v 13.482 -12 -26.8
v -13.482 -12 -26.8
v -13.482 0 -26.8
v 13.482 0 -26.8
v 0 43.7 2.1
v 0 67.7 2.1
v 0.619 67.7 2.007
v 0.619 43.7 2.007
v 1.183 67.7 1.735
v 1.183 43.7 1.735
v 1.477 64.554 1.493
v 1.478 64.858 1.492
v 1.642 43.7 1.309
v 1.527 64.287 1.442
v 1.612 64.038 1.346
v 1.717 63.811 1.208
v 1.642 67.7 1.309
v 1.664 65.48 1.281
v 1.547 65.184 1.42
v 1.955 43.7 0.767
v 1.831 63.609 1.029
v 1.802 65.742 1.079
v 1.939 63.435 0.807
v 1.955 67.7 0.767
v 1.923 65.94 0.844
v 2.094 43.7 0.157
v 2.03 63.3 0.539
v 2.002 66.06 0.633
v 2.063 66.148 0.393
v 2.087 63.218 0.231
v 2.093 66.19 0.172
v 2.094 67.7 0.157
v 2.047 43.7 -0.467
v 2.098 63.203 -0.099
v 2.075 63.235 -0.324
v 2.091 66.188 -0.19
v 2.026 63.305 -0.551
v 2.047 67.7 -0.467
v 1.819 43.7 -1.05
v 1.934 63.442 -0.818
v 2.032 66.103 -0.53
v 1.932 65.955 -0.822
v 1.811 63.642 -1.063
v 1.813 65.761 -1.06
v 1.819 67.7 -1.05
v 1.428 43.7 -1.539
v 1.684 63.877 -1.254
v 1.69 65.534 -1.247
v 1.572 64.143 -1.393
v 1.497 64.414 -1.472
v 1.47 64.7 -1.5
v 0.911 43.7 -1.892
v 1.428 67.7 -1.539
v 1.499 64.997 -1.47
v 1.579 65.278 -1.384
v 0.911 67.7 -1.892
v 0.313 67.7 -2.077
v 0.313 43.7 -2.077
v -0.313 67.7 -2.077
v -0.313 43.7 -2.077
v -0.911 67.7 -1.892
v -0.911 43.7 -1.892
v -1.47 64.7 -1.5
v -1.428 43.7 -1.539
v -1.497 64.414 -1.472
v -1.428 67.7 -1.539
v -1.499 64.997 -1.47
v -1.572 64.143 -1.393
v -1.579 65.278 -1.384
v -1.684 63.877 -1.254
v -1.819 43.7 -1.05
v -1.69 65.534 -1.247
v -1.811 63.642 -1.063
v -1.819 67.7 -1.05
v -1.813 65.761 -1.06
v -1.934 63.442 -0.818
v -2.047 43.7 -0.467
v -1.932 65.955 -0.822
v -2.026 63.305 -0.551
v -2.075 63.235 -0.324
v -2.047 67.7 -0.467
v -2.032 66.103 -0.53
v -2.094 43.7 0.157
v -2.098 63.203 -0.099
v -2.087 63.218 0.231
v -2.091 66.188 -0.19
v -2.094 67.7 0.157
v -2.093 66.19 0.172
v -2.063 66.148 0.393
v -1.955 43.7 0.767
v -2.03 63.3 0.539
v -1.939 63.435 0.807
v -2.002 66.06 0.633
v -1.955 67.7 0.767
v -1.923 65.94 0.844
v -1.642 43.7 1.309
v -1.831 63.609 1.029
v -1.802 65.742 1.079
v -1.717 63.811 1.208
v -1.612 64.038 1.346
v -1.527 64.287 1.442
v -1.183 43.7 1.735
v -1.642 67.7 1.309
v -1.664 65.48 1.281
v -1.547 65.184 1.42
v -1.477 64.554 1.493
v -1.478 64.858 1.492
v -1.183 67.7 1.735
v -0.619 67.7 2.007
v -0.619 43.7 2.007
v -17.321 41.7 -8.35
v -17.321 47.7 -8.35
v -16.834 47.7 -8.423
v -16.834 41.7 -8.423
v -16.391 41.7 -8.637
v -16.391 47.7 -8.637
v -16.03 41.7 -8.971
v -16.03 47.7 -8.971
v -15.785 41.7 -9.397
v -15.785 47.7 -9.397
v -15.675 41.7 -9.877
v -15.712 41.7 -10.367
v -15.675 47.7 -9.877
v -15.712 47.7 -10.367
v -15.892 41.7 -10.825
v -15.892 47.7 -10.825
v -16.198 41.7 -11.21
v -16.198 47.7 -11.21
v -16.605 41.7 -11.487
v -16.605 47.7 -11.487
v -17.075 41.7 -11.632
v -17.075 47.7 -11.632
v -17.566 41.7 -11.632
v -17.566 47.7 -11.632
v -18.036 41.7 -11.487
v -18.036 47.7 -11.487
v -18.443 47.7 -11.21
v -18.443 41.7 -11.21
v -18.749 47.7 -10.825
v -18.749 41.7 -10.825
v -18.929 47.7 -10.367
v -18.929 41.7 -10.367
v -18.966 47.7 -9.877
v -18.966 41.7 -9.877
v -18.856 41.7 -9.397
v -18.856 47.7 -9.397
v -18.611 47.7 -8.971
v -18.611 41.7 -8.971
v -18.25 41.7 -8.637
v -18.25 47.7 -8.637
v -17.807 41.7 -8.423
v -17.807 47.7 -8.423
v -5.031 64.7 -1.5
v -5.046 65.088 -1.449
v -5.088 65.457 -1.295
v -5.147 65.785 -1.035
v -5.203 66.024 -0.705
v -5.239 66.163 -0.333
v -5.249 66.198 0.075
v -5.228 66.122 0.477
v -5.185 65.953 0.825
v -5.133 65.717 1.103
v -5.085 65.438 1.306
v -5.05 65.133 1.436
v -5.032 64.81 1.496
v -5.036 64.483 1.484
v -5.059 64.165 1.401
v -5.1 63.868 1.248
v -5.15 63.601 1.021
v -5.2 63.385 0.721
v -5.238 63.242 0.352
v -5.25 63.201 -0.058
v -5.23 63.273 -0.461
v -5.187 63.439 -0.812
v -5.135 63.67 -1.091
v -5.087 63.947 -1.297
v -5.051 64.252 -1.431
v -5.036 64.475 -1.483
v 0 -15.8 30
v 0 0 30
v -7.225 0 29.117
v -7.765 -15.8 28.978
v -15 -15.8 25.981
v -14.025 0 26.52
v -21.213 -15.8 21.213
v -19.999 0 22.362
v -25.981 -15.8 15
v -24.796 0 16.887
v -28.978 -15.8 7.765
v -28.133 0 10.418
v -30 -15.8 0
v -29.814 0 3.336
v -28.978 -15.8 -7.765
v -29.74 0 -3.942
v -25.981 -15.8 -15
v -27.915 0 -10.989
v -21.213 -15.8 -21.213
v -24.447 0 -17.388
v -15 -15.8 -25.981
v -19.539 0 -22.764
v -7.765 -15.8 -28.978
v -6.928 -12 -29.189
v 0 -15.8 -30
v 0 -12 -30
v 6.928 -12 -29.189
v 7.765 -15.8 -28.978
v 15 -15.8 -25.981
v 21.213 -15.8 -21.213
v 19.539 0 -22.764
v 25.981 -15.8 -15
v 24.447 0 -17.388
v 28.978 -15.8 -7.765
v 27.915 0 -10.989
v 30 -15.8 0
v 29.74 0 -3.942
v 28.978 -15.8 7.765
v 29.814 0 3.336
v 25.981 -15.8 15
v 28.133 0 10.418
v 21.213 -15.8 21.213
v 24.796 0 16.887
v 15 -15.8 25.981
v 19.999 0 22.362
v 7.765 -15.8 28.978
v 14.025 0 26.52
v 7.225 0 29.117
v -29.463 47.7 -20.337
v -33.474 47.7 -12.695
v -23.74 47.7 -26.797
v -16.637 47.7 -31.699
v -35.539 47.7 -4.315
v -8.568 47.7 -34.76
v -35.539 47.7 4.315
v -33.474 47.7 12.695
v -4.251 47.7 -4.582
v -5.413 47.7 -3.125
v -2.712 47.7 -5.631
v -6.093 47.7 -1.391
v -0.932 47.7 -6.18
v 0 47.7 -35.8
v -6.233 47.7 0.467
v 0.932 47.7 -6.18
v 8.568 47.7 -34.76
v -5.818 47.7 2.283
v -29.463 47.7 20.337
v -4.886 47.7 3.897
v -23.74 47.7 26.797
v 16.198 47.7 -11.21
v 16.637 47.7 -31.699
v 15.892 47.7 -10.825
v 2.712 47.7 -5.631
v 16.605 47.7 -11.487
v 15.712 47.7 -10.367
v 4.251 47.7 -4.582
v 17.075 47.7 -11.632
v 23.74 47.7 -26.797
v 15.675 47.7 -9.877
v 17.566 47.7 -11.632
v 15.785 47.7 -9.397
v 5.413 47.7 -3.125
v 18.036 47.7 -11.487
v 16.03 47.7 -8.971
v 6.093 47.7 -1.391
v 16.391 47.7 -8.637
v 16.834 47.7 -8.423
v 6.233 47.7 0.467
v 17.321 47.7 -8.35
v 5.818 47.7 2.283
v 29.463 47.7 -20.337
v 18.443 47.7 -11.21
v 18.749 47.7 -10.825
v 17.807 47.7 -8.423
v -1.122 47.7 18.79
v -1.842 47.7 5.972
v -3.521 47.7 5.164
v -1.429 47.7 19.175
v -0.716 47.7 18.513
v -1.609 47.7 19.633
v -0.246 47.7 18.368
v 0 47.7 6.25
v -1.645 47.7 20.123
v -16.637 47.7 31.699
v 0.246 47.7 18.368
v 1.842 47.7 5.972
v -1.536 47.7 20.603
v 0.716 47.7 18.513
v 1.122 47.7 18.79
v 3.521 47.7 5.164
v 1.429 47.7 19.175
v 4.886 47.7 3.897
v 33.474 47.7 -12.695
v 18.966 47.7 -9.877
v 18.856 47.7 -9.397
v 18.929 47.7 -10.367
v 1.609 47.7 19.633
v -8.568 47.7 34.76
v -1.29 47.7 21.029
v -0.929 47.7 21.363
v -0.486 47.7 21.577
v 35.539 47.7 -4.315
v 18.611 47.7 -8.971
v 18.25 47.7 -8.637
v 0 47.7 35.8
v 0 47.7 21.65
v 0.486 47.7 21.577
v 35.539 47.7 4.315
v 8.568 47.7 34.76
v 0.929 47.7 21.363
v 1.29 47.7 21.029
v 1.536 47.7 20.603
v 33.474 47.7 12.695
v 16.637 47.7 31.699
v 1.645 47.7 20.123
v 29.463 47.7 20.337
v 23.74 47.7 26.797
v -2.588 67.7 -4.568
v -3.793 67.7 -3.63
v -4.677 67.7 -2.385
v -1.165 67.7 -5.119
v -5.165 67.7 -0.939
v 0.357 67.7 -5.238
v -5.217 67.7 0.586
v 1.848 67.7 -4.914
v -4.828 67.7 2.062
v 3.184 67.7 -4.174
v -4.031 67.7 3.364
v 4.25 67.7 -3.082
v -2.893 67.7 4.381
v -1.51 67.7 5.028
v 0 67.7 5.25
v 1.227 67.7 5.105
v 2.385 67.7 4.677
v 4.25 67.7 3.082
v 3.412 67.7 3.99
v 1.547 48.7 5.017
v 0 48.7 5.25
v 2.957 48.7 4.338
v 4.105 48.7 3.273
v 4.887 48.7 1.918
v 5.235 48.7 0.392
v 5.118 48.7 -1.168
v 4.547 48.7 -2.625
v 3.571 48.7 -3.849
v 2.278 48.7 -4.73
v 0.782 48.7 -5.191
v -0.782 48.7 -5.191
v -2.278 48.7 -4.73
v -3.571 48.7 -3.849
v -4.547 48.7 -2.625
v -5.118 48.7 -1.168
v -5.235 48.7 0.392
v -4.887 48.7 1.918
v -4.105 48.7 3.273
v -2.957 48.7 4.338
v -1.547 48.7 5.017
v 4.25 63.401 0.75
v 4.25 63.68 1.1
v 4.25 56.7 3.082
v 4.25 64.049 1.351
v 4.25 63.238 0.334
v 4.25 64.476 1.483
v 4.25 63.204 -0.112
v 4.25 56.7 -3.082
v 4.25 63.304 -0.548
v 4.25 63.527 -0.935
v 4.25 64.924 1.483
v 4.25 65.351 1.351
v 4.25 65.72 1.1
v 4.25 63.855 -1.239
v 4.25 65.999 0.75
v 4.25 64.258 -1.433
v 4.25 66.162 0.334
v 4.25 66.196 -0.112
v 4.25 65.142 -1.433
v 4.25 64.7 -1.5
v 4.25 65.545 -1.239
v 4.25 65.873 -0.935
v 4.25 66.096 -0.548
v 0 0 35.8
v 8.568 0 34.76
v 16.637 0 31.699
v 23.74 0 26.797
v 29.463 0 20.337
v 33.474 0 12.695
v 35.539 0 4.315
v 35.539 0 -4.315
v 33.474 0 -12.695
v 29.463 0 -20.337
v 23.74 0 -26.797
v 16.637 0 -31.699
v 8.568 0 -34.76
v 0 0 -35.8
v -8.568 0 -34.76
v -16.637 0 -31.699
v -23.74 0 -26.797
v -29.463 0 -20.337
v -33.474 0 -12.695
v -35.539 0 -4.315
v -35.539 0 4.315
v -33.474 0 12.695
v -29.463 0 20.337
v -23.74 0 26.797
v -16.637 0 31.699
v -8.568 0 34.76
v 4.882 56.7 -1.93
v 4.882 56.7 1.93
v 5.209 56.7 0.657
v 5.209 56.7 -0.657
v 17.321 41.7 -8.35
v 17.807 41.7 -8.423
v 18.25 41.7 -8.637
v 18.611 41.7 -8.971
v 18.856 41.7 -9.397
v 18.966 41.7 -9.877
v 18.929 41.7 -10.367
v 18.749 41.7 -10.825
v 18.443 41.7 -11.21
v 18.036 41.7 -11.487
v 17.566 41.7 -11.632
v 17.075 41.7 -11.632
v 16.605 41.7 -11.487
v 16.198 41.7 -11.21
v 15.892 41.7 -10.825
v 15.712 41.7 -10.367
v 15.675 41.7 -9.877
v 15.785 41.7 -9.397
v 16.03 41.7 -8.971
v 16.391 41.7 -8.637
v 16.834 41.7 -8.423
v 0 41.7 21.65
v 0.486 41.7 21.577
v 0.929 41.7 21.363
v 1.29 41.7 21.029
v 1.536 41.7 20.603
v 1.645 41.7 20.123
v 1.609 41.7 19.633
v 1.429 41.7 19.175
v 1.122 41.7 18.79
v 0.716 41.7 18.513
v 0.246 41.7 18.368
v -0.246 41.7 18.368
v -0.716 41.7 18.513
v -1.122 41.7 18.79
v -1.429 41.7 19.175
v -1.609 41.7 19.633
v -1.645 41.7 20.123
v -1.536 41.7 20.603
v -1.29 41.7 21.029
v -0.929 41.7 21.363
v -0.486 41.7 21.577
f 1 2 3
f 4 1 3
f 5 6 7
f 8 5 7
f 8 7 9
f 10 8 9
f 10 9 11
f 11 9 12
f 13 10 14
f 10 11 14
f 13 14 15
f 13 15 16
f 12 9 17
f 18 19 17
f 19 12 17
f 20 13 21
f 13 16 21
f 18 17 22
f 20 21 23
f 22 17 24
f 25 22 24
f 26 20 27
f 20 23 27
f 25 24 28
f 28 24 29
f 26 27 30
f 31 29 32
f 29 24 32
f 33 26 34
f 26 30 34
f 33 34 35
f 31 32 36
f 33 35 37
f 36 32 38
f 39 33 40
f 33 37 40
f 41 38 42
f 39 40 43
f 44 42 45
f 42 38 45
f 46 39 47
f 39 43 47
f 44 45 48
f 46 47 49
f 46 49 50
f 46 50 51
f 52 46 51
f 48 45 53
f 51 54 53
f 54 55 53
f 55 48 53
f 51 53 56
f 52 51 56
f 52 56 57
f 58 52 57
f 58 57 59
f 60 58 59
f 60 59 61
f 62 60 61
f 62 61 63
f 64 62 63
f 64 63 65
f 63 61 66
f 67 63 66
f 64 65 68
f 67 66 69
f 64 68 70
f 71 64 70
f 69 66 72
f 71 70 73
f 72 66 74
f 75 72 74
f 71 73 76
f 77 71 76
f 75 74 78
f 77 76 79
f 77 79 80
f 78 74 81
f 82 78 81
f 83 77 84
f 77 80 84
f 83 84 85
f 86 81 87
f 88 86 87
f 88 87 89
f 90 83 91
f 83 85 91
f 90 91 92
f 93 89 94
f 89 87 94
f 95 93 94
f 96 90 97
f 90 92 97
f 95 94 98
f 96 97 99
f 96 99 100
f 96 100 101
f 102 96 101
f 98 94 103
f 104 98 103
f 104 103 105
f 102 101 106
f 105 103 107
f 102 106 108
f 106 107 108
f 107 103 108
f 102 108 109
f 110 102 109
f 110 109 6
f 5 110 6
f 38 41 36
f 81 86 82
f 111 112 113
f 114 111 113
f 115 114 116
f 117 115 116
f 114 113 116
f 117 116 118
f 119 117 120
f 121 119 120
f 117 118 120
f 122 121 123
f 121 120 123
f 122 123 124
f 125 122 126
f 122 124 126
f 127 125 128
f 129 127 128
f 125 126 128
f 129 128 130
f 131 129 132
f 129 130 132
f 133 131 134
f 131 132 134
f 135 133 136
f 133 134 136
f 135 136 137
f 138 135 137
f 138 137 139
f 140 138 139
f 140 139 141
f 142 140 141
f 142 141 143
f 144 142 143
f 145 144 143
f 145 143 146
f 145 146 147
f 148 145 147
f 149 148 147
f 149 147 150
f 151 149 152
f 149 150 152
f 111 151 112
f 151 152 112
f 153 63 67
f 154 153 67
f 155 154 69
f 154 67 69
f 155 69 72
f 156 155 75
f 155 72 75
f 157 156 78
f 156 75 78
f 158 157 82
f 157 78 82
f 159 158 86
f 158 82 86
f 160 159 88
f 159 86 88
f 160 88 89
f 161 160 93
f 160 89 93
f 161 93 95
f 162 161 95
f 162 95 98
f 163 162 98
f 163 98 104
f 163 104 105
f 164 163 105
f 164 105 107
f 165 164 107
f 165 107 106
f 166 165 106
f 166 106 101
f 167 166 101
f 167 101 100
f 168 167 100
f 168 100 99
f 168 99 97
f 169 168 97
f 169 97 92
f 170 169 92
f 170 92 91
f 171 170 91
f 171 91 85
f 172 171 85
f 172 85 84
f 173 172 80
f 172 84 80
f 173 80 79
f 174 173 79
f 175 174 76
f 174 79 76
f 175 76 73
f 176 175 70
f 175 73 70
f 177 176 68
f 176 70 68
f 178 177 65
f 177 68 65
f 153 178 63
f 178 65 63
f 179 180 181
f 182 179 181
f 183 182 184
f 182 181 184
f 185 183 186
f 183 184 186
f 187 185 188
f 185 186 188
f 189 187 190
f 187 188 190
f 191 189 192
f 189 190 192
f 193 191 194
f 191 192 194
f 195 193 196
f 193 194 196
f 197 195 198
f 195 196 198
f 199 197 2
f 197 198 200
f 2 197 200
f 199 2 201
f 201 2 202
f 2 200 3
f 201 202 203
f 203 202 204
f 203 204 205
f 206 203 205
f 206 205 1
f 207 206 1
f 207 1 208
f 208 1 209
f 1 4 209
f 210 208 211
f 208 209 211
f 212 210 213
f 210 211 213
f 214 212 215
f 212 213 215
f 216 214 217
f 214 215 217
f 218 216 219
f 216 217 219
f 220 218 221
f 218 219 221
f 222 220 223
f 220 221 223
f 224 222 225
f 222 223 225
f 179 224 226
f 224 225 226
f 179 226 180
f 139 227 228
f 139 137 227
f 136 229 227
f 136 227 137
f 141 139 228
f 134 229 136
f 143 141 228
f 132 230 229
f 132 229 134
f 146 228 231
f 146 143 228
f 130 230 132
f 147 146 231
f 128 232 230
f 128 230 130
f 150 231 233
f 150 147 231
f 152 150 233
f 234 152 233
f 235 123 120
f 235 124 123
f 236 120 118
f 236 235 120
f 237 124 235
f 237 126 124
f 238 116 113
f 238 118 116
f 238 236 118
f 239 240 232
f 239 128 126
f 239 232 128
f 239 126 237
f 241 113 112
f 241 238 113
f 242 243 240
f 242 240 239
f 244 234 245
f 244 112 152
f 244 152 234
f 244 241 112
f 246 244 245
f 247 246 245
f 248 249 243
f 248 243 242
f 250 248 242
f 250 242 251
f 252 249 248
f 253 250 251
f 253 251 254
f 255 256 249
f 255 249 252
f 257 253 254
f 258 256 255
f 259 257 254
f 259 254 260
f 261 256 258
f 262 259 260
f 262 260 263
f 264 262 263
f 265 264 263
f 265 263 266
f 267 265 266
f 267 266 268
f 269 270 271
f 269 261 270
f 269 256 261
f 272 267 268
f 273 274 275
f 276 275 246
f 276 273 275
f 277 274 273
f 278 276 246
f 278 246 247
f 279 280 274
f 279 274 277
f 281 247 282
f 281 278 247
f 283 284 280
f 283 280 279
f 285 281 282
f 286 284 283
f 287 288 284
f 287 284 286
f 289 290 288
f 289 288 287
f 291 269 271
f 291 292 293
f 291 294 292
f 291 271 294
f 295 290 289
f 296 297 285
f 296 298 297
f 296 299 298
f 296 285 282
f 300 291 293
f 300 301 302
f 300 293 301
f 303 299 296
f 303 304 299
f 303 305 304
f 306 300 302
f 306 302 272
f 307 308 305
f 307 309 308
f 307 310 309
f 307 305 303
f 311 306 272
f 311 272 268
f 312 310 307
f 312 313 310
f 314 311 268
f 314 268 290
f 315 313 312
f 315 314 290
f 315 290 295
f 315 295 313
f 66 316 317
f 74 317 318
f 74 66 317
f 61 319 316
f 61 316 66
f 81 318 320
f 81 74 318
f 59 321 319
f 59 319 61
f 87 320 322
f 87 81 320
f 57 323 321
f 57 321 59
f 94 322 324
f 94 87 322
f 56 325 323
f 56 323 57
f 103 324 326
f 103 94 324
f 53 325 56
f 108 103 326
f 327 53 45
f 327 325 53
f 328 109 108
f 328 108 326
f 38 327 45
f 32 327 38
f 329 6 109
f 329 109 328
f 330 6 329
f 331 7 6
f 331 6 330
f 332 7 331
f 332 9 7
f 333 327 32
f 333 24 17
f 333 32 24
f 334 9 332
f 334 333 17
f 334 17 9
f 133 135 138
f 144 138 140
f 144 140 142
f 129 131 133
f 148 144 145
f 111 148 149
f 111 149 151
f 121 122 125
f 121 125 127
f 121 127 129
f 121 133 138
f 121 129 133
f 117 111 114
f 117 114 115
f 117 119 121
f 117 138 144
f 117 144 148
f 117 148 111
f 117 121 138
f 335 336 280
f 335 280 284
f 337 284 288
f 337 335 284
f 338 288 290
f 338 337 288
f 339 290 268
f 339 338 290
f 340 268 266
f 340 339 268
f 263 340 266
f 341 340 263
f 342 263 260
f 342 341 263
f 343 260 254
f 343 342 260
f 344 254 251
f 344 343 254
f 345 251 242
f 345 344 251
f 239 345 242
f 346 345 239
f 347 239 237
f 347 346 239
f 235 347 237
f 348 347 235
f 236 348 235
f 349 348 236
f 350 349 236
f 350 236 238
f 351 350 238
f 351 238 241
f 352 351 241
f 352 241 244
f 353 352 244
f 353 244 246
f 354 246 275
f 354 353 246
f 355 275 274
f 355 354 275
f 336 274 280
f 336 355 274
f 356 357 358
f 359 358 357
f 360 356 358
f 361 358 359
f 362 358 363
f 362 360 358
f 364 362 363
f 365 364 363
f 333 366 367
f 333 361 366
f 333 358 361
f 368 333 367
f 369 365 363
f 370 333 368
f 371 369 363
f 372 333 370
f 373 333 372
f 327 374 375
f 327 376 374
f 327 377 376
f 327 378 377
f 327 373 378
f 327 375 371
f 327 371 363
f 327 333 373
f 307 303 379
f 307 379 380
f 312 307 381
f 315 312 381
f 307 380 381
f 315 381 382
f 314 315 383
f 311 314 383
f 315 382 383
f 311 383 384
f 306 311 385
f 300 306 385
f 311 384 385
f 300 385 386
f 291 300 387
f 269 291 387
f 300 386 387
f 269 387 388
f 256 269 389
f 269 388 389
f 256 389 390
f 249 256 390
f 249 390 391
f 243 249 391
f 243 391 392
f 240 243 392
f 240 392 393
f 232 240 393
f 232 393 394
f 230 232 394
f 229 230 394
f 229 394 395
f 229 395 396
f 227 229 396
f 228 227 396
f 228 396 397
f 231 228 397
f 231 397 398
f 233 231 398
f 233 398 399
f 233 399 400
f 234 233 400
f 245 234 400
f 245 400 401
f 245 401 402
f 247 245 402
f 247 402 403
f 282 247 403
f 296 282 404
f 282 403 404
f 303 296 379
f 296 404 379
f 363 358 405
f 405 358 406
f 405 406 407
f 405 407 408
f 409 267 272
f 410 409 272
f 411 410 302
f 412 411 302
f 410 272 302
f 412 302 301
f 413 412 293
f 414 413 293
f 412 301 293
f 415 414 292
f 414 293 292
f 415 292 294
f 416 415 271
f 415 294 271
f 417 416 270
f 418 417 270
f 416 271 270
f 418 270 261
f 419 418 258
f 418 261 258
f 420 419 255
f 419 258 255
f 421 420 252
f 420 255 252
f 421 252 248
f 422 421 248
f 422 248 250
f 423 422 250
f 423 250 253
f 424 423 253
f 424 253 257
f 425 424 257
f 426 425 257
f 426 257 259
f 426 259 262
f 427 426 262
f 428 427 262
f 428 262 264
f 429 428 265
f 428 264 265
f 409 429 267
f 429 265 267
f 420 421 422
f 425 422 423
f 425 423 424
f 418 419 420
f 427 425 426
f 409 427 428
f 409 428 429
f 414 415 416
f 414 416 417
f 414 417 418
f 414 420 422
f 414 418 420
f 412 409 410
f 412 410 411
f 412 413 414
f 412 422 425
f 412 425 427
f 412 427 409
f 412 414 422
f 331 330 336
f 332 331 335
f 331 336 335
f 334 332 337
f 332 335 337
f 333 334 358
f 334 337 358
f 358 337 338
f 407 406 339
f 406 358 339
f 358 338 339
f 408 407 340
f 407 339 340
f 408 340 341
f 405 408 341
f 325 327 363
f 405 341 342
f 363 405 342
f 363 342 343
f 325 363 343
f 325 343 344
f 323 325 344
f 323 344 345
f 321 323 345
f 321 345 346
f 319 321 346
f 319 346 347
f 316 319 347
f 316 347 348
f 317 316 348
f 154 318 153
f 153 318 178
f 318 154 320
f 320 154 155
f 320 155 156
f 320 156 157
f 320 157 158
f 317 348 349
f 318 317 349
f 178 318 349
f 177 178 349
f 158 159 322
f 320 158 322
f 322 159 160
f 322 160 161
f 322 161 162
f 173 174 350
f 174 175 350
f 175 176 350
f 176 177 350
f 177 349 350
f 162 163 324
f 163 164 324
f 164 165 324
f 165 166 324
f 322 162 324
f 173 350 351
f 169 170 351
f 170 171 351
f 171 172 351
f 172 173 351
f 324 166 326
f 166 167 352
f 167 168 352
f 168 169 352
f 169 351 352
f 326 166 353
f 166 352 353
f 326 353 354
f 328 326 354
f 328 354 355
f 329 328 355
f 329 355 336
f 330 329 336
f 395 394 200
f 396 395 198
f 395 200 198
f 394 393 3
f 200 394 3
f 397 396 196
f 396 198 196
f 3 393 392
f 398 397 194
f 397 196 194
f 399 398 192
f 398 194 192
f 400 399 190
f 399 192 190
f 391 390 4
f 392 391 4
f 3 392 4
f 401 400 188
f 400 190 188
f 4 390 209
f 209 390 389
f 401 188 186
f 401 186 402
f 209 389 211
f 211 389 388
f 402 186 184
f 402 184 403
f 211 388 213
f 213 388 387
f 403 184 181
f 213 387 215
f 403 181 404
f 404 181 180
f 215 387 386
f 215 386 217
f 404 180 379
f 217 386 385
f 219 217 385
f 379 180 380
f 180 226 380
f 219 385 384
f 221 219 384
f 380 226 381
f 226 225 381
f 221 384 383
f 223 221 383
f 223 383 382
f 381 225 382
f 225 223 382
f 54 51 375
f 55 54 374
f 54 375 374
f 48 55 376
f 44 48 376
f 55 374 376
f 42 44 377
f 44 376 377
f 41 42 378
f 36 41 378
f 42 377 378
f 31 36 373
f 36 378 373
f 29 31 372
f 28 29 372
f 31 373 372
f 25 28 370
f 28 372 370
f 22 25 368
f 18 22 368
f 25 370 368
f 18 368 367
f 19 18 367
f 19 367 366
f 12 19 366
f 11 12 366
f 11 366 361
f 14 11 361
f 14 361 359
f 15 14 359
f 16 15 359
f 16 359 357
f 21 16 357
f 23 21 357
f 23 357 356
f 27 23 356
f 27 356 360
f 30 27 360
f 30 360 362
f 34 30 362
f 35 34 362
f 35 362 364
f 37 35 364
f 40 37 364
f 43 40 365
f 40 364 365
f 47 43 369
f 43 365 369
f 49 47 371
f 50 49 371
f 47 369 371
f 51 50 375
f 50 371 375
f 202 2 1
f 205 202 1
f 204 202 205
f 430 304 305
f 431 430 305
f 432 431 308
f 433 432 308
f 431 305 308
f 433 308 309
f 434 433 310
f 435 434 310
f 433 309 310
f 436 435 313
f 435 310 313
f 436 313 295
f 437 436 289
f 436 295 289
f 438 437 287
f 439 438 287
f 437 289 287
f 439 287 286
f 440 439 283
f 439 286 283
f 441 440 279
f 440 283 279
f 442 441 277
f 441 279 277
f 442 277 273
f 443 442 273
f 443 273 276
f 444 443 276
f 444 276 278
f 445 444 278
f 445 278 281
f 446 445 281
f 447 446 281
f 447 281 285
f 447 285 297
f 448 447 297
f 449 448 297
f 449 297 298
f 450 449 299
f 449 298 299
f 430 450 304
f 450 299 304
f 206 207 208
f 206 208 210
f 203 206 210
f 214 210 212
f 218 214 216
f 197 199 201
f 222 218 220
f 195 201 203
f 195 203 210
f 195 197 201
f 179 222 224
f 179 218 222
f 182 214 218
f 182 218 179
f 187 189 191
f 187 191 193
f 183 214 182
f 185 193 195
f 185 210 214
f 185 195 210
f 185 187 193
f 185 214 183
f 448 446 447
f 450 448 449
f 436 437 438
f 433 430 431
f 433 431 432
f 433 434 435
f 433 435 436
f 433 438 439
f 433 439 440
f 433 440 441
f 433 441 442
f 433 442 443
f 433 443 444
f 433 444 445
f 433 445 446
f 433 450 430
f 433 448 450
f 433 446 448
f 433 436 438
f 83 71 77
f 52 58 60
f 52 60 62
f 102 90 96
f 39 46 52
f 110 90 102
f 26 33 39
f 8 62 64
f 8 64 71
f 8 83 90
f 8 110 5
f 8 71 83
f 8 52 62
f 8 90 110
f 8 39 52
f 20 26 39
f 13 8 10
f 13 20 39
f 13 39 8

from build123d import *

# Parameters (mm, degrees)
SKETCH_1_R          = 35.8
EXTRUDE_1_DEPTH     = 47.7
SKETCH_2_R          = 5.25
EXTRUDE_2_DEPTH     = 20
SKETCH_3_W          = 7.138794325
SKETCH_3_H          = 6.164414002
CUT_EXTRUDE_1_DEPTH = 11
SKETCH_4_R          = 1.5
CUT_EXTRUDE_2_DEPTH = 87.422985947
CHAMFER_1_SIZE      = 1
SKETCH_5_R          = 1.65
CUT_EXTRUDE_3_DEPTH = 6
SKETCH_6_R          = 2.1
CUT_EXTRUDE_4_DEPTH = 24
SKETCH_7_R          = 30
EXTRUDE_3_DEPTH     = 15.8
SKETCH_8_W          = 3.2
SKETCH_8_H          = 12
CUT_EXTRUDE_5_DEPTH = 68.4


with BuildPart() as part:
    # 草图1 → 凸台-拉伸1 (new body)
    with BuildSketch(Plane(origin=(0, 0, 0), x_dir=(1, 0, 0), z_dir=(0, 1, 0))):
        with Locations(Location((0, 0, 0), (0, 0, 270))):
            Circle(SKETCH_1_R)
    extrude(amount=EXTRUDE_1_DEPTH)

    # 草图2 → 凸台-拉伸2 (add)
    with BuildSketch(Plane(origin=(0, 47.7, 0), x_dir=(1, 0, 0), z_dir=(0, 1, 0))):
        with Locations(Location((0, 0, 0), (0, 0, 270))):
            Circle(SKETCH_2_R)
    extrude(amount=EXTRUDE_2_DEPTH)

    # 草图3 → 切除-拉伸1 (cut)
    with BuildSketch(Plane(origin=(0, 67.7, 0), x_dir=(1, 0, 0), z_dir=(0, 1, 0))):
        with Locations((7.819397163, 0)):
            Rectangle(SKETCH_3_W, SKETCH_3_H)
    extrude(amount=-CUT_EXTRUDE_1_DEPTH, mode=Mode.SUBTRACT)

    # 草图4 → 切除-拉伸2 (cut, through all)
    with BuildSketch(Plane(origin=(4.25, 0, 0), x_dir=(0, 0, -1), z_dir=(1, 0, 0))):
        with Locations((0, 64.7)):
            Circle(SKETCH_4_R)
    extrude(amount=-CUT_EXTRUDE_2_DEPTH, mode=Mode.SUBTRACT)

    # 倒角1
    chamfer_1_edges = [part.edges().sort_by_distance(p)[0] for p in [
        (0, 47.7, -5.25),
    ]]
    chamfer(chamfer_1_edges, length=CHAMFER_1_SIZE)

    # 草图5 → 切除-拉伸3 (cut)
    with BuildSketch(Plane(origin=(0, 47.7, 0), x_dir=(1, 0, 0), z_dir=(0, 1, 0))):
        with Locations(Location((0, -20, 0), (0, 0, 270))):
            Circle(SKETCH_5_R)
        with Locations(Location((-17.320508076, 10, 0), (0, 0, 270))):
            Circle(SKETCH_5_R)
        with Locations(Location((17.320508076, 10, 0), (0, 0, 270))):
            Circle(SKETCH_5_R)
    extrude(amount=-CUT_EXTRUDE_3_DEPTH, mode=Mode.SUBTRACT)

    # 草图6 → 切除-拉伸4 (cut)
    with BuildSketch(Plane(origin=(0, 67.7, 0), x_dir=(1, 0, 0), z_dir=(0, 1, 0))):
        with Locations(Location((0, 0, 0), (0, 0, 270))):
            Circle(SKETCH_6_R)
    extrude(amount=-CUT_EXTRUDE_4_DEPTH, mode=Mode.SUBTRACT)

    # 草图7 → 凸台-拉伸3 (add)
    with BuildSketch(Plane.XZ):
        with Locations(Location((0, 0, 0), (0, 0, 90))):
            Circle(SKETCH_7_R)
    extrude(amount=EXTRUDE_3_DEPTH)

    # 草图8 → 切除-拉伸5 (cut, symmetric)
    with BuildSketch(Plane(origin=(0, 0, 0), x_dir=(0, 0, -1), z_dir=(1, 0, 0))):
        with Locations((28.4, -6)):
            Rectangle(SKETCH_8_W, SKETCH_8_H)
    extrude(amount=CUT_EXTRUDE_5_DEPTH, both=True, mode=Mode.SUBTRACT)


solid = part.part
